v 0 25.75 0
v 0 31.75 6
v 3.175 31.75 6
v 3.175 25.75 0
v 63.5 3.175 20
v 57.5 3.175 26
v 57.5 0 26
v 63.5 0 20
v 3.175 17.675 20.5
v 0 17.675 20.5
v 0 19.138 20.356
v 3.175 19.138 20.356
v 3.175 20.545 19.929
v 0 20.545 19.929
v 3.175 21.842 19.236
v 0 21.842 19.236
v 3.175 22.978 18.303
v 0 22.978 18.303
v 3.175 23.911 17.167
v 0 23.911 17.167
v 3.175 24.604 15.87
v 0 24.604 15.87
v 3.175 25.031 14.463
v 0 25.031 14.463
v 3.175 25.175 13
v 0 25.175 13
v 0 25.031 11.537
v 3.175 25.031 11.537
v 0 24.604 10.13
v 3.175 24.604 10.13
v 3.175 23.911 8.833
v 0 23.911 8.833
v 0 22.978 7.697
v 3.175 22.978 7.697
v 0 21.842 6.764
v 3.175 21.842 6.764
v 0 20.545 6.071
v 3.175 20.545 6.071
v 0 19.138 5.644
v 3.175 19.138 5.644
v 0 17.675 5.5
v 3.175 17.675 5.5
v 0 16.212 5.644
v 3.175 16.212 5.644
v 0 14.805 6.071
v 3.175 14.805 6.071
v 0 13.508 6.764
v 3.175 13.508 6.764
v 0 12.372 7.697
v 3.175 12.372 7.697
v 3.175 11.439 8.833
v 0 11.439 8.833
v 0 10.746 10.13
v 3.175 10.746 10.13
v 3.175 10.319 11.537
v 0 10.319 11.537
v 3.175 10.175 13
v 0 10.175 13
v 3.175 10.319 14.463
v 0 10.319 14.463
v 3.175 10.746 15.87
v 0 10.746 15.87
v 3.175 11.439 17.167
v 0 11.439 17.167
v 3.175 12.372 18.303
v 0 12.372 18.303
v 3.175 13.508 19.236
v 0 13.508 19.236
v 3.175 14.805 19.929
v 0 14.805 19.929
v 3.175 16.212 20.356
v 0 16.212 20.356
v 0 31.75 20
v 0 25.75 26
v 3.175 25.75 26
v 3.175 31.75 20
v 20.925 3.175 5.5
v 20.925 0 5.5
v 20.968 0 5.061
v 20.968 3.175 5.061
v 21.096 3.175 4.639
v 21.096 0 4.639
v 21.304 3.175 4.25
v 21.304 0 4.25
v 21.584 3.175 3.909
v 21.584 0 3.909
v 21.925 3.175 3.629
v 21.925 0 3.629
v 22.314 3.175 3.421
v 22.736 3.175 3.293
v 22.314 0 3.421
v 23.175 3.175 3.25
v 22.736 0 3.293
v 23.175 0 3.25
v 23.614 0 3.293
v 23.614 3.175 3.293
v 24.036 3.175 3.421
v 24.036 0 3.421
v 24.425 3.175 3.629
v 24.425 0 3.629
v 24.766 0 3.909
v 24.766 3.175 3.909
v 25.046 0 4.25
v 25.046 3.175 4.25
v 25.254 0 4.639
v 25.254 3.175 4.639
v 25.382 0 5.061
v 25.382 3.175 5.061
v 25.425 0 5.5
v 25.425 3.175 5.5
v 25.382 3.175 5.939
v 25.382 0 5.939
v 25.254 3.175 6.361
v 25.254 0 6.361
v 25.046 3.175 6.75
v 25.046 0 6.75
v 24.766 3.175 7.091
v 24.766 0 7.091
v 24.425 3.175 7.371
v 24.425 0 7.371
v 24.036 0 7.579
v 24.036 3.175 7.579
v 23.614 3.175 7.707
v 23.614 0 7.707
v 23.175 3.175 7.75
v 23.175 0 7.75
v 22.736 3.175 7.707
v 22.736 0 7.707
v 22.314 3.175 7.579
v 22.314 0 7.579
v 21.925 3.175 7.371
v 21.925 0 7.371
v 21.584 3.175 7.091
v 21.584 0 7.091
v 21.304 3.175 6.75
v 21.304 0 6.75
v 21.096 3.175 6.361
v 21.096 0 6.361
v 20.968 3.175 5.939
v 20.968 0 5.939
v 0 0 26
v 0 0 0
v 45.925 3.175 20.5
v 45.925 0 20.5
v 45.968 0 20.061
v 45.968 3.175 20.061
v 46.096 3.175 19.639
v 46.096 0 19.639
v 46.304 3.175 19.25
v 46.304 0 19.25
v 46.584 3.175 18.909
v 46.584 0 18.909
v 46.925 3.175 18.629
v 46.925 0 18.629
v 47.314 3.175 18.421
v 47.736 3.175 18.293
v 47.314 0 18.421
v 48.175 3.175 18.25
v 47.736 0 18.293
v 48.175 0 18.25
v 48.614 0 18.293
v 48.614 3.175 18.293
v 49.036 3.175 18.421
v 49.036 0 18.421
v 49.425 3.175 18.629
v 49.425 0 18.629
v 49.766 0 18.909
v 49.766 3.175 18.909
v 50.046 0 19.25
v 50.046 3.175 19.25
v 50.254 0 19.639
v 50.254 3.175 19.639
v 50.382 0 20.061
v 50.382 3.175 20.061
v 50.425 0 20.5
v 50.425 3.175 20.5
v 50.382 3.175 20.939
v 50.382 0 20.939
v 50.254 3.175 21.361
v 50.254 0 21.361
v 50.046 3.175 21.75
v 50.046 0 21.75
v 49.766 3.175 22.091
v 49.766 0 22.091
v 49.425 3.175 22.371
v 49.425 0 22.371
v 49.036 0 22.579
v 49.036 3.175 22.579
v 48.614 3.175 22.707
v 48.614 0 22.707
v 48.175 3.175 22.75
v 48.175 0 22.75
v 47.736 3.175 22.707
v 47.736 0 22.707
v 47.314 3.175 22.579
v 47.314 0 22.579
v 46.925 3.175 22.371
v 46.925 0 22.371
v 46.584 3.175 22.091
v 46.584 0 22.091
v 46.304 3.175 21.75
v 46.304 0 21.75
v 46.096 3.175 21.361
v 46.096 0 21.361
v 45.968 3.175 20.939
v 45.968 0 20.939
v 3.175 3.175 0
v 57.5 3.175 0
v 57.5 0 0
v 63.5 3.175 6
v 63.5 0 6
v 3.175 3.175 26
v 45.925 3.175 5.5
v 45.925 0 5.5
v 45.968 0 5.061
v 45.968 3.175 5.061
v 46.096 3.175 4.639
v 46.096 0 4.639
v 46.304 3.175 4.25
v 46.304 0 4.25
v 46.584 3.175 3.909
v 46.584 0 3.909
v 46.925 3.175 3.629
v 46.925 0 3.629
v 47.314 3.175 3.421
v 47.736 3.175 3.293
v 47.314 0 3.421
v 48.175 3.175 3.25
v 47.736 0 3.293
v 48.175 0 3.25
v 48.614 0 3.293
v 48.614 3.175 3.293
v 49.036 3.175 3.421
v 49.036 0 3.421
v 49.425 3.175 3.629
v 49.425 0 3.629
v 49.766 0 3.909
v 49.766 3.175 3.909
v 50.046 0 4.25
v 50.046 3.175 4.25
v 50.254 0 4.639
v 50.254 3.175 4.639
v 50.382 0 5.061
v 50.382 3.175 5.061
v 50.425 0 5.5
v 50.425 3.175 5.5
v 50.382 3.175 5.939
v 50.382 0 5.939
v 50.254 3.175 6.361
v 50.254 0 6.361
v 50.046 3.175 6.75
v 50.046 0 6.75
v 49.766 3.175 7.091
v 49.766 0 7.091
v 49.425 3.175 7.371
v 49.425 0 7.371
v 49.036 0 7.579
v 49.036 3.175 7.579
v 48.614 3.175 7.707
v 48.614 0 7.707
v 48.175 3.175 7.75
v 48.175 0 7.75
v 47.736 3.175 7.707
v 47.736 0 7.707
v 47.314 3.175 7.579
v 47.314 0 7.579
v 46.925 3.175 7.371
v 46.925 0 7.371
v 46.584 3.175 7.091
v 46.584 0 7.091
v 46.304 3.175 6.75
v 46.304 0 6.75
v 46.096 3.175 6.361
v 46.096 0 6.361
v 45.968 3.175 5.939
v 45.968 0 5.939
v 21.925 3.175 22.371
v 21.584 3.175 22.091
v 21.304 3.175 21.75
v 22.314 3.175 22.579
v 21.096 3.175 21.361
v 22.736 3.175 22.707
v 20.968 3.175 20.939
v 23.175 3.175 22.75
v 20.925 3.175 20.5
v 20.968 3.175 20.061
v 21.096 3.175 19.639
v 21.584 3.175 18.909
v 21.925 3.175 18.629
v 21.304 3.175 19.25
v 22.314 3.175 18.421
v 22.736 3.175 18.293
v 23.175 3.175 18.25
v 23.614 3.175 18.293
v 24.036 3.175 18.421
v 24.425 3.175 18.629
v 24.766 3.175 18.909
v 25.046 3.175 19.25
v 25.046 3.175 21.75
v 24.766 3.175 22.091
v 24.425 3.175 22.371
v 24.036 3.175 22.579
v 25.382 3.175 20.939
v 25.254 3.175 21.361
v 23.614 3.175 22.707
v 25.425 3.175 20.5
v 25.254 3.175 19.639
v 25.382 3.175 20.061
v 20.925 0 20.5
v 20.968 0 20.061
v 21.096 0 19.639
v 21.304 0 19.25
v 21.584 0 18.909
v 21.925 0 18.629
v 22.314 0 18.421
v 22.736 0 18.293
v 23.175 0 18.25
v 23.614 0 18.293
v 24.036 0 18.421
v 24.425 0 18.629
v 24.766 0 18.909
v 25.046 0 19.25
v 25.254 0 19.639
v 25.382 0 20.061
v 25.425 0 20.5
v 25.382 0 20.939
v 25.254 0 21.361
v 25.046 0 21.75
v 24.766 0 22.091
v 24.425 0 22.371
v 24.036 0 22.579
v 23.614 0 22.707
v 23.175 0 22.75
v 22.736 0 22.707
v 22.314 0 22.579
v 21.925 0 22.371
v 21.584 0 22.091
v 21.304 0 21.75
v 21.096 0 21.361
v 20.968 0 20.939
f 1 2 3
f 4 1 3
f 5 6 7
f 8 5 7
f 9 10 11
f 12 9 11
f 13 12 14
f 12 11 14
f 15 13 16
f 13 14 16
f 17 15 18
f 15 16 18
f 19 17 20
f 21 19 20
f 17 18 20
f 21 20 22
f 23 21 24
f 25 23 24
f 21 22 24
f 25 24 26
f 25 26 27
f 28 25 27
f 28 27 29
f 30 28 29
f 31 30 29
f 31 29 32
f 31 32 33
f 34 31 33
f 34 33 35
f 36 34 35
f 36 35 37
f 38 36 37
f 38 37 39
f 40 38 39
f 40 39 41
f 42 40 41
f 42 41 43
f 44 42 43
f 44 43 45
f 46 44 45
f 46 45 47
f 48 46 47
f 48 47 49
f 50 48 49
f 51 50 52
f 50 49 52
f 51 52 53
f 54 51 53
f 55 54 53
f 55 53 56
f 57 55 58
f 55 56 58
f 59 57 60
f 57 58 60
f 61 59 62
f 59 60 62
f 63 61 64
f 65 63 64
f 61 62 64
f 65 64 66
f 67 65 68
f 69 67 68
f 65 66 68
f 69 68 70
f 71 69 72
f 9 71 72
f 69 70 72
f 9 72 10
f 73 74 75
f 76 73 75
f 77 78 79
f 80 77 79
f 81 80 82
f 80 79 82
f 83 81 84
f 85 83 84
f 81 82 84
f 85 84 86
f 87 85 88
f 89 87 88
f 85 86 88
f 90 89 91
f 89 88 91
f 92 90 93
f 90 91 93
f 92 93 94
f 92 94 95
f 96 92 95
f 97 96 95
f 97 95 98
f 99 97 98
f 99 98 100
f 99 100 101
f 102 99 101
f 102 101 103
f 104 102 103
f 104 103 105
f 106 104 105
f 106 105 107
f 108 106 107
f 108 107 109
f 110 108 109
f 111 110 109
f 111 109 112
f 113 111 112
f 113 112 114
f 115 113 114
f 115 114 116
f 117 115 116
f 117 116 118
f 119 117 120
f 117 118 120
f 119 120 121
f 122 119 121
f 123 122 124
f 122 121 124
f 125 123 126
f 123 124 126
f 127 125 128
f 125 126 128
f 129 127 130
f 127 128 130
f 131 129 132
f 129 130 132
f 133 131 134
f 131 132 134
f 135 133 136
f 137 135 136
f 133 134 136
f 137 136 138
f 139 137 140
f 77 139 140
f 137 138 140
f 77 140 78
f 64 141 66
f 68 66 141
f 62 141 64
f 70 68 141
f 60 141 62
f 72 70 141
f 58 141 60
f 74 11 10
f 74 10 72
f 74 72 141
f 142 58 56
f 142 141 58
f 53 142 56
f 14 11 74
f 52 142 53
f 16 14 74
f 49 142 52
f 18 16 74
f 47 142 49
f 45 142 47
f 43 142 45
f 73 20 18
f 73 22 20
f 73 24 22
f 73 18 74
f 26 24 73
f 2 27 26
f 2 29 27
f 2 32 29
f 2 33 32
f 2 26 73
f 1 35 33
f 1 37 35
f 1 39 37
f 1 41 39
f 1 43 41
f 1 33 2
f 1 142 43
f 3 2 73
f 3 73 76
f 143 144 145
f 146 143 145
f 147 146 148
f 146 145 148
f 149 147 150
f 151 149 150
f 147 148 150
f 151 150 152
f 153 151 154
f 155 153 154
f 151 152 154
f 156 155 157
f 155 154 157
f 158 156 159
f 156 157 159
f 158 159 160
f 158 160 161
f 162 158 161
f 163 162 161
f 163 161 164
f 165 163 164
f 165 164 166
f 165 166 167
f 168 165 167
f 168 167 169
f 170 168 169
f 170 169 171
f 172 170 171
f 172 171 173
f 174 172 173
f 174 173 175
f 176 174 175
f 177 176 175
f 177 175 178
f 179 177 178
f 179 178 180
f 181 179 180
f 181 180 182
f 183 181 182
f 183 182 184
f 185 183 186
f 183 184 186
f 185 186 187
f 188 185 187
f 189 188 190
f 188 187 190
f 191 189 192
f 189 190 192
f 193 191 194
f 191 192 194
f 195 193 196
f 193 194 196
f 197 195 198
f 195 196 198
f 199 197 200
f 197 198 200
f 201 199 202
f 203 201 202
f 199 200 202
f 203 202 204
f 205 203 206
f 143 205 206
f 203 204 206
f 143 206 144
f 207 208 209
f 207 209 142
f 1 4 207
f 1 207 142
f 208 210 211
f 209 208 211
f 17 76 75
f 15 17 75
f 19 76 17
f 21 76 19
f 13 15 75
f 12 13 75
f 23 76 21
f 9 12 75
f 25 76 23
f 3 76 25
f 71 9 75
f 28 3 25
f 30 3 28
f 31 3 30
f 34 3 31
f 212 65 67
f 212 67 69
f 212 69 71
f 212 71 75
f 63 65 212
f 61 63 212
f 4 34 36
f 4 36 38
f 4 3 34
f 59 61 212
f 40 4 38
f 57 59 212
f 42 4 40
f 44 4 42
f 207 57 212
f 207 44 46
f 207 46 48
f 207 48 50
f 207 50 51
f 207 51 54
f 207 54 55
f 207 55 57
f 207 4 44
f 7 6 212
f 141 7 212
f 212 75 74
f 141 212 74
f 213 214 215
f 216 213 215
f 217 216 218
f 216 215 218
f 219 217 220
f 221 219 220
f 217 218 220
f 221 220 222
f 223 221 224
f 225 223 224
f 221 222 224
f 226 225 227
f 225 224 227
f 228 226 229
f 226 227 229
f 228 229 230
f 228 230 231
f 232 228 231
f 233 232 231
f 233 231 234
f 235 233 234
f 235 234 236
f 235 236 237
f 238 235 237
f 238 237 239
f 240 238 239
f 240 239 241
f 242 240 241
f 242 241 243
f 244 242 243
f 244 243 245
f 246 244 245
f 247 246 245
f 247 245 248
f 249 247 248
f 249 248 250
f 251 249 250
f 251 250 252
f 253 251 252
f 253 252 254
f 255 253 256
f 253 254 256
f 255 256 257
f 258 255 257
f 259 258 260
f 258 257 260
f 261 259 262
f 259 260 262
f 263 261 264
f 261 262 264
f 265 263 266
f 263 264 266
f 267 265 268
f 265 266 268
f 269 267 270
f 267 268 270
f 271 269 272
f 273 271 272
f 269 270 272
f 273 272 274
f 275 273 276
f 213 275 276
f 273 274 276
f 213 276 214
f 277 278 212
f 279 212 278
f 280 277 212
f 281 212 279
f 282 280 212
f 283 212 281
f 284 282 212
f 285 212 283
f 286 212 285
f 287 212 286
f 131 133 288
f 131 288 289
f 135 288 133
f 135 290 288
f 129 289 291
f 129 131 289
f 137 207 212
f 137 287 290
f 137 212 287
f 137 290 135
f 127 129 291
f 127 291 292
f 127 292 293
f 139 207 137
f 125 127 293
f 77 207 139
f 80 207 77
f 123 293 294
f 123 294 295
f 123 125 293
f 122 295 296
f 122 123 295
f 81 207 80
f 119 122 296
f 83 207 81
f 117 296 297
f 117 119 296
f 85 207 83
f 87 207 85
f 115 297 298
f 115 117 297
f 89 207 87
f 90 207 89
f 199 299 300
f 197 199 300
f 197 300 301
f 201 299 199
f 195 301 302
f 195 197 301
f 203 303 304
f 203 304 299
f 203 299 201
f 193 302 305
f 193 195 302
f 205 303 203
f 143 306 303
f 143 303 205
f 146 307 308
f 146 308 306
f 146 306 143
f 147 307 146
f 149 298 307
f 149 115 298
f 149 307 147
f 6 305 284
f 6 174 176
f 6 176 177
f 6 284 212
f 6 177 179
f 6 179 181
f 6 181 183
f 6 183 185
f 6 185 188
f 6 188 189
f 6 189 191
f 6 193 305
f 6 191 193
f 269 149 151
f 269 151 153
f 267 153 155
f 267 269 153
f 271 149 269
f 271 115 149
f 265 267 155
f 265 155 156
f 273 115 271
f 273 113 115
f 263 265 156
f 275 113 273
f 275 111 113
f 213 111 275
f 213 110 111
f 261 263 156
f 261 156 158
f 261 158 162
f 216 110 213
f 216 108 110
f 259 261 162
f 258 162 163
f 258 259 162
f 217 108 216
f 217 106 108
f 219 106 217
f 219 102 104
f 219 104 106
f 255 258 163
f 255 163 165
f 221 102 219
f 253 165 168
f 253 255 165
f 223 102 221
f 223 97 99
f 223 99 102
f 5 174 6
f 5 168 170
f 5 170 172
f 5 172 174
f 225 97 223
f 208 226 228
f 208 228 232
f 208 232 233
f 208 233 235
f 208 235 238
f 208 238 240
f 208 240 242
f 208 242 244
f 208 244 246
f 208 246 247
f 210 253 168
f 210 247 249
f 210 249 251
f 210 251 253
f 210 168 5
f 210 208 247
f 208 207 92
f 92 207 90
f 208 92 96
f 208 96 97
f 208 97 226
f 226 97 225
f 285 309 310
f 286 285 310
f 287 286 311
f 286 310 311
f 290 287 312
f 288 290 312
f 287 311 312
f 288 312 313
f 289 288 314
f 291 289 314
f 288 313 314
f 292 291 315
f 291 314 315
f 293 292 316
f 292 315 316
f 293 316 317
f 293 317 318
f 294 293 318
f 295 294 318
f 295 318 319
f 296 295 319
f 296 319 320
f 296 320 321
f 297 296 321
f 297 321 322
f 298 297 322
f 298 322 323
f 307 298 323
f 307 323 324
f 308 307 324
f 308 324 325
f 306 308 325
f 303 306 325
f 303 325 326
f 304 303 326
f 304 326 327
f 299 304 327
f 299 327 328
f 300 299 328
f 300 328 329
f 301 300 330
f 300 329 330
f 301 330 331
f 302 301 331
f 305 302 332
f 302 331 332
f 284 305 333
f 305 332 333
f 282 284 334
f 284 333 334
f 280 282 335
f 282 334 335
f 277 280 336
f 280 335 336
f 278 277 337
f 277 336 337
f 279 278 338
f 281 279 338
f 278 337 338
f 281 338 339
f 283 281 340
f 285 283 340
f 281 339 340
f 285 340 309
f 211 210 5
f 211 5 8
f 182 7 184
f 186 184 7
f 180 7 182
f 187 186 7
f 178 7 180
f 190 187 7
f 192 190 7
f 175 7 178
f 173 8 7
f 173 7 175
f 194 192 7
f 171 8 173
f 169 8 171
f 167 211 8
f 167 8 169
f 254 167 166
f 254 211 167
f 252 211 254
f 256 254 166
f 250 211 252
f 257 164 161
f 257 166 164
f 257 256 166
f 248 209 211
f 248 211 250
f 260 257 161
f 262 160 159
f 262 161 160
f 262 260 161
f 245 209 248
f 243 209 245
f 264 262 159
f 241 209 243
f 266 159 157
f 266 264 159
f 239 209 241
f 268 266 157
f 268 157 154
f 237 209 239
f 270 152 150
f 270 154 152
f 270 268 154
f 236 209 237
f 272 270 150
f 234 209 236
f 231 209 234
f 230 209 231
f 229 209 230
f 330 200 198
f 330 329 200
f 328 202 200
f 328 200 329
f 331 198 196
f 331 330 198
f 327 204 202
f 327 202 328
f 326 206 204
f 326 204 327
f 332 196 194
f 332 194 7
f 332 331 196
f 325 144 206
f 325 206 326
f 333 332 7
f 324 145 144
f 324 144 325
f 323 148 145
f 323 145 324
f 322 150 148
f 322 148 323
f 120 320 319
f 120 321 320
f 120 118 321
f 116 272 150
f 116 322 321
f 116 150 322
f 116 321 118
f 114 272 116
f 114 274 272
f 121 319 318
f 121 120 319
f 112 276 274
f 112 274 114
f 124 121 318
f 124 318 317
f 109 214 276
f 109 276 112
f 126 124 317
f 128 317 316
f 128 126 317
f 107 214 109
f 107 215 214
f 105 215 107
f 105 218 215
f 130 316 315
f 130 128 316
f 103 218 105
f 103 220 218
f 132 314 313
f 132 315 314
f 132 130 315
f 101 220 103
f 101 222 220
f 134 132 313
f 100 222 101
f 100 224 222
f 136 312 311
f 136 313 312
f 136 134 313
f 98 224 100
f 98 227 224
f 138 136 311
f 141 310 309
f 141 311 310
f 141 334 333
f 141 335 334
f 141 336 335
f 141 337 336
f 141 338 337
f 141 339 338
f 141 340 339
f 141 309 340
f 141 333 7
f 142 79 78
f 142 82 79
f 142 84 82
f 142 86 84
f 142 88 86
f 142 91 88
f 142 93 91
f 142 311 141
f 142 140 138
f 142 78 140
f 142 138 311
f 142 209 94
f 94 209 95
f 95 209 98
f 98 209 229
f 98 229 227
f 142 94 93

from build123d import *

# Parameters (mm, degrees)
BOSS_EXTRUDE1_DEPTH  = 26
M4_CLEARANCE_HOLE1_D = 4.5
SKETCH5_R            = 7.5
CUT_EXTRUDE1_DEPTH   = 64.5
CHAMFER1_SIZE        = 6


with BuildPart() as part:
    # Sketch1 → Boss-Extrude1 (new body)
    with BuildSketch(Plane.XY):
        Polygon((0, 0), (0, 31.75), (3.175, 31.75), (3.175, 3.175), (63.5, 3.175), (63.5, 0), align=None)
    extrude(amount=BOSS_EXTRUDE1_DEPTH)

    # M4 Clearance Hole1 (through all)
    with Locations(Plane(origin=(0, 3.175, 0), x_dir=(1, 0, 0), z_dir=(0, 1, 0))):
        with Locations((23.175, -20.5), (23.175, -5.5), (48.175, -5.5), (48.175, -20.5)):
            Hole(M4_CLEARANCE_HOLE1_D / 2)

    # Sketch5 → Cut-Extrude1 (cut, through all)
    with BuildSketch(Plane.ZY):
        with Locations((13, 17.675)):
            Circle(SKETCH5_R)
    extrude(amount=-CUT_EXTRUDE1_DEPTH, mode=Mode.SUBTRACT)

    # Chamfer1
    chamfer1_edges = [part.edges().sort_by_distance(p)[0] for p in [
        (1.5875, 31.75, 26),
        (1.5875, 31.75, 0),
        (63.5, 1.5875, 0),
        (63.5, 1.5875, 26),
    ]]
    chamfer(chamfer1_edges, length=CHAMFER1_SIZE)


solid = part.part
